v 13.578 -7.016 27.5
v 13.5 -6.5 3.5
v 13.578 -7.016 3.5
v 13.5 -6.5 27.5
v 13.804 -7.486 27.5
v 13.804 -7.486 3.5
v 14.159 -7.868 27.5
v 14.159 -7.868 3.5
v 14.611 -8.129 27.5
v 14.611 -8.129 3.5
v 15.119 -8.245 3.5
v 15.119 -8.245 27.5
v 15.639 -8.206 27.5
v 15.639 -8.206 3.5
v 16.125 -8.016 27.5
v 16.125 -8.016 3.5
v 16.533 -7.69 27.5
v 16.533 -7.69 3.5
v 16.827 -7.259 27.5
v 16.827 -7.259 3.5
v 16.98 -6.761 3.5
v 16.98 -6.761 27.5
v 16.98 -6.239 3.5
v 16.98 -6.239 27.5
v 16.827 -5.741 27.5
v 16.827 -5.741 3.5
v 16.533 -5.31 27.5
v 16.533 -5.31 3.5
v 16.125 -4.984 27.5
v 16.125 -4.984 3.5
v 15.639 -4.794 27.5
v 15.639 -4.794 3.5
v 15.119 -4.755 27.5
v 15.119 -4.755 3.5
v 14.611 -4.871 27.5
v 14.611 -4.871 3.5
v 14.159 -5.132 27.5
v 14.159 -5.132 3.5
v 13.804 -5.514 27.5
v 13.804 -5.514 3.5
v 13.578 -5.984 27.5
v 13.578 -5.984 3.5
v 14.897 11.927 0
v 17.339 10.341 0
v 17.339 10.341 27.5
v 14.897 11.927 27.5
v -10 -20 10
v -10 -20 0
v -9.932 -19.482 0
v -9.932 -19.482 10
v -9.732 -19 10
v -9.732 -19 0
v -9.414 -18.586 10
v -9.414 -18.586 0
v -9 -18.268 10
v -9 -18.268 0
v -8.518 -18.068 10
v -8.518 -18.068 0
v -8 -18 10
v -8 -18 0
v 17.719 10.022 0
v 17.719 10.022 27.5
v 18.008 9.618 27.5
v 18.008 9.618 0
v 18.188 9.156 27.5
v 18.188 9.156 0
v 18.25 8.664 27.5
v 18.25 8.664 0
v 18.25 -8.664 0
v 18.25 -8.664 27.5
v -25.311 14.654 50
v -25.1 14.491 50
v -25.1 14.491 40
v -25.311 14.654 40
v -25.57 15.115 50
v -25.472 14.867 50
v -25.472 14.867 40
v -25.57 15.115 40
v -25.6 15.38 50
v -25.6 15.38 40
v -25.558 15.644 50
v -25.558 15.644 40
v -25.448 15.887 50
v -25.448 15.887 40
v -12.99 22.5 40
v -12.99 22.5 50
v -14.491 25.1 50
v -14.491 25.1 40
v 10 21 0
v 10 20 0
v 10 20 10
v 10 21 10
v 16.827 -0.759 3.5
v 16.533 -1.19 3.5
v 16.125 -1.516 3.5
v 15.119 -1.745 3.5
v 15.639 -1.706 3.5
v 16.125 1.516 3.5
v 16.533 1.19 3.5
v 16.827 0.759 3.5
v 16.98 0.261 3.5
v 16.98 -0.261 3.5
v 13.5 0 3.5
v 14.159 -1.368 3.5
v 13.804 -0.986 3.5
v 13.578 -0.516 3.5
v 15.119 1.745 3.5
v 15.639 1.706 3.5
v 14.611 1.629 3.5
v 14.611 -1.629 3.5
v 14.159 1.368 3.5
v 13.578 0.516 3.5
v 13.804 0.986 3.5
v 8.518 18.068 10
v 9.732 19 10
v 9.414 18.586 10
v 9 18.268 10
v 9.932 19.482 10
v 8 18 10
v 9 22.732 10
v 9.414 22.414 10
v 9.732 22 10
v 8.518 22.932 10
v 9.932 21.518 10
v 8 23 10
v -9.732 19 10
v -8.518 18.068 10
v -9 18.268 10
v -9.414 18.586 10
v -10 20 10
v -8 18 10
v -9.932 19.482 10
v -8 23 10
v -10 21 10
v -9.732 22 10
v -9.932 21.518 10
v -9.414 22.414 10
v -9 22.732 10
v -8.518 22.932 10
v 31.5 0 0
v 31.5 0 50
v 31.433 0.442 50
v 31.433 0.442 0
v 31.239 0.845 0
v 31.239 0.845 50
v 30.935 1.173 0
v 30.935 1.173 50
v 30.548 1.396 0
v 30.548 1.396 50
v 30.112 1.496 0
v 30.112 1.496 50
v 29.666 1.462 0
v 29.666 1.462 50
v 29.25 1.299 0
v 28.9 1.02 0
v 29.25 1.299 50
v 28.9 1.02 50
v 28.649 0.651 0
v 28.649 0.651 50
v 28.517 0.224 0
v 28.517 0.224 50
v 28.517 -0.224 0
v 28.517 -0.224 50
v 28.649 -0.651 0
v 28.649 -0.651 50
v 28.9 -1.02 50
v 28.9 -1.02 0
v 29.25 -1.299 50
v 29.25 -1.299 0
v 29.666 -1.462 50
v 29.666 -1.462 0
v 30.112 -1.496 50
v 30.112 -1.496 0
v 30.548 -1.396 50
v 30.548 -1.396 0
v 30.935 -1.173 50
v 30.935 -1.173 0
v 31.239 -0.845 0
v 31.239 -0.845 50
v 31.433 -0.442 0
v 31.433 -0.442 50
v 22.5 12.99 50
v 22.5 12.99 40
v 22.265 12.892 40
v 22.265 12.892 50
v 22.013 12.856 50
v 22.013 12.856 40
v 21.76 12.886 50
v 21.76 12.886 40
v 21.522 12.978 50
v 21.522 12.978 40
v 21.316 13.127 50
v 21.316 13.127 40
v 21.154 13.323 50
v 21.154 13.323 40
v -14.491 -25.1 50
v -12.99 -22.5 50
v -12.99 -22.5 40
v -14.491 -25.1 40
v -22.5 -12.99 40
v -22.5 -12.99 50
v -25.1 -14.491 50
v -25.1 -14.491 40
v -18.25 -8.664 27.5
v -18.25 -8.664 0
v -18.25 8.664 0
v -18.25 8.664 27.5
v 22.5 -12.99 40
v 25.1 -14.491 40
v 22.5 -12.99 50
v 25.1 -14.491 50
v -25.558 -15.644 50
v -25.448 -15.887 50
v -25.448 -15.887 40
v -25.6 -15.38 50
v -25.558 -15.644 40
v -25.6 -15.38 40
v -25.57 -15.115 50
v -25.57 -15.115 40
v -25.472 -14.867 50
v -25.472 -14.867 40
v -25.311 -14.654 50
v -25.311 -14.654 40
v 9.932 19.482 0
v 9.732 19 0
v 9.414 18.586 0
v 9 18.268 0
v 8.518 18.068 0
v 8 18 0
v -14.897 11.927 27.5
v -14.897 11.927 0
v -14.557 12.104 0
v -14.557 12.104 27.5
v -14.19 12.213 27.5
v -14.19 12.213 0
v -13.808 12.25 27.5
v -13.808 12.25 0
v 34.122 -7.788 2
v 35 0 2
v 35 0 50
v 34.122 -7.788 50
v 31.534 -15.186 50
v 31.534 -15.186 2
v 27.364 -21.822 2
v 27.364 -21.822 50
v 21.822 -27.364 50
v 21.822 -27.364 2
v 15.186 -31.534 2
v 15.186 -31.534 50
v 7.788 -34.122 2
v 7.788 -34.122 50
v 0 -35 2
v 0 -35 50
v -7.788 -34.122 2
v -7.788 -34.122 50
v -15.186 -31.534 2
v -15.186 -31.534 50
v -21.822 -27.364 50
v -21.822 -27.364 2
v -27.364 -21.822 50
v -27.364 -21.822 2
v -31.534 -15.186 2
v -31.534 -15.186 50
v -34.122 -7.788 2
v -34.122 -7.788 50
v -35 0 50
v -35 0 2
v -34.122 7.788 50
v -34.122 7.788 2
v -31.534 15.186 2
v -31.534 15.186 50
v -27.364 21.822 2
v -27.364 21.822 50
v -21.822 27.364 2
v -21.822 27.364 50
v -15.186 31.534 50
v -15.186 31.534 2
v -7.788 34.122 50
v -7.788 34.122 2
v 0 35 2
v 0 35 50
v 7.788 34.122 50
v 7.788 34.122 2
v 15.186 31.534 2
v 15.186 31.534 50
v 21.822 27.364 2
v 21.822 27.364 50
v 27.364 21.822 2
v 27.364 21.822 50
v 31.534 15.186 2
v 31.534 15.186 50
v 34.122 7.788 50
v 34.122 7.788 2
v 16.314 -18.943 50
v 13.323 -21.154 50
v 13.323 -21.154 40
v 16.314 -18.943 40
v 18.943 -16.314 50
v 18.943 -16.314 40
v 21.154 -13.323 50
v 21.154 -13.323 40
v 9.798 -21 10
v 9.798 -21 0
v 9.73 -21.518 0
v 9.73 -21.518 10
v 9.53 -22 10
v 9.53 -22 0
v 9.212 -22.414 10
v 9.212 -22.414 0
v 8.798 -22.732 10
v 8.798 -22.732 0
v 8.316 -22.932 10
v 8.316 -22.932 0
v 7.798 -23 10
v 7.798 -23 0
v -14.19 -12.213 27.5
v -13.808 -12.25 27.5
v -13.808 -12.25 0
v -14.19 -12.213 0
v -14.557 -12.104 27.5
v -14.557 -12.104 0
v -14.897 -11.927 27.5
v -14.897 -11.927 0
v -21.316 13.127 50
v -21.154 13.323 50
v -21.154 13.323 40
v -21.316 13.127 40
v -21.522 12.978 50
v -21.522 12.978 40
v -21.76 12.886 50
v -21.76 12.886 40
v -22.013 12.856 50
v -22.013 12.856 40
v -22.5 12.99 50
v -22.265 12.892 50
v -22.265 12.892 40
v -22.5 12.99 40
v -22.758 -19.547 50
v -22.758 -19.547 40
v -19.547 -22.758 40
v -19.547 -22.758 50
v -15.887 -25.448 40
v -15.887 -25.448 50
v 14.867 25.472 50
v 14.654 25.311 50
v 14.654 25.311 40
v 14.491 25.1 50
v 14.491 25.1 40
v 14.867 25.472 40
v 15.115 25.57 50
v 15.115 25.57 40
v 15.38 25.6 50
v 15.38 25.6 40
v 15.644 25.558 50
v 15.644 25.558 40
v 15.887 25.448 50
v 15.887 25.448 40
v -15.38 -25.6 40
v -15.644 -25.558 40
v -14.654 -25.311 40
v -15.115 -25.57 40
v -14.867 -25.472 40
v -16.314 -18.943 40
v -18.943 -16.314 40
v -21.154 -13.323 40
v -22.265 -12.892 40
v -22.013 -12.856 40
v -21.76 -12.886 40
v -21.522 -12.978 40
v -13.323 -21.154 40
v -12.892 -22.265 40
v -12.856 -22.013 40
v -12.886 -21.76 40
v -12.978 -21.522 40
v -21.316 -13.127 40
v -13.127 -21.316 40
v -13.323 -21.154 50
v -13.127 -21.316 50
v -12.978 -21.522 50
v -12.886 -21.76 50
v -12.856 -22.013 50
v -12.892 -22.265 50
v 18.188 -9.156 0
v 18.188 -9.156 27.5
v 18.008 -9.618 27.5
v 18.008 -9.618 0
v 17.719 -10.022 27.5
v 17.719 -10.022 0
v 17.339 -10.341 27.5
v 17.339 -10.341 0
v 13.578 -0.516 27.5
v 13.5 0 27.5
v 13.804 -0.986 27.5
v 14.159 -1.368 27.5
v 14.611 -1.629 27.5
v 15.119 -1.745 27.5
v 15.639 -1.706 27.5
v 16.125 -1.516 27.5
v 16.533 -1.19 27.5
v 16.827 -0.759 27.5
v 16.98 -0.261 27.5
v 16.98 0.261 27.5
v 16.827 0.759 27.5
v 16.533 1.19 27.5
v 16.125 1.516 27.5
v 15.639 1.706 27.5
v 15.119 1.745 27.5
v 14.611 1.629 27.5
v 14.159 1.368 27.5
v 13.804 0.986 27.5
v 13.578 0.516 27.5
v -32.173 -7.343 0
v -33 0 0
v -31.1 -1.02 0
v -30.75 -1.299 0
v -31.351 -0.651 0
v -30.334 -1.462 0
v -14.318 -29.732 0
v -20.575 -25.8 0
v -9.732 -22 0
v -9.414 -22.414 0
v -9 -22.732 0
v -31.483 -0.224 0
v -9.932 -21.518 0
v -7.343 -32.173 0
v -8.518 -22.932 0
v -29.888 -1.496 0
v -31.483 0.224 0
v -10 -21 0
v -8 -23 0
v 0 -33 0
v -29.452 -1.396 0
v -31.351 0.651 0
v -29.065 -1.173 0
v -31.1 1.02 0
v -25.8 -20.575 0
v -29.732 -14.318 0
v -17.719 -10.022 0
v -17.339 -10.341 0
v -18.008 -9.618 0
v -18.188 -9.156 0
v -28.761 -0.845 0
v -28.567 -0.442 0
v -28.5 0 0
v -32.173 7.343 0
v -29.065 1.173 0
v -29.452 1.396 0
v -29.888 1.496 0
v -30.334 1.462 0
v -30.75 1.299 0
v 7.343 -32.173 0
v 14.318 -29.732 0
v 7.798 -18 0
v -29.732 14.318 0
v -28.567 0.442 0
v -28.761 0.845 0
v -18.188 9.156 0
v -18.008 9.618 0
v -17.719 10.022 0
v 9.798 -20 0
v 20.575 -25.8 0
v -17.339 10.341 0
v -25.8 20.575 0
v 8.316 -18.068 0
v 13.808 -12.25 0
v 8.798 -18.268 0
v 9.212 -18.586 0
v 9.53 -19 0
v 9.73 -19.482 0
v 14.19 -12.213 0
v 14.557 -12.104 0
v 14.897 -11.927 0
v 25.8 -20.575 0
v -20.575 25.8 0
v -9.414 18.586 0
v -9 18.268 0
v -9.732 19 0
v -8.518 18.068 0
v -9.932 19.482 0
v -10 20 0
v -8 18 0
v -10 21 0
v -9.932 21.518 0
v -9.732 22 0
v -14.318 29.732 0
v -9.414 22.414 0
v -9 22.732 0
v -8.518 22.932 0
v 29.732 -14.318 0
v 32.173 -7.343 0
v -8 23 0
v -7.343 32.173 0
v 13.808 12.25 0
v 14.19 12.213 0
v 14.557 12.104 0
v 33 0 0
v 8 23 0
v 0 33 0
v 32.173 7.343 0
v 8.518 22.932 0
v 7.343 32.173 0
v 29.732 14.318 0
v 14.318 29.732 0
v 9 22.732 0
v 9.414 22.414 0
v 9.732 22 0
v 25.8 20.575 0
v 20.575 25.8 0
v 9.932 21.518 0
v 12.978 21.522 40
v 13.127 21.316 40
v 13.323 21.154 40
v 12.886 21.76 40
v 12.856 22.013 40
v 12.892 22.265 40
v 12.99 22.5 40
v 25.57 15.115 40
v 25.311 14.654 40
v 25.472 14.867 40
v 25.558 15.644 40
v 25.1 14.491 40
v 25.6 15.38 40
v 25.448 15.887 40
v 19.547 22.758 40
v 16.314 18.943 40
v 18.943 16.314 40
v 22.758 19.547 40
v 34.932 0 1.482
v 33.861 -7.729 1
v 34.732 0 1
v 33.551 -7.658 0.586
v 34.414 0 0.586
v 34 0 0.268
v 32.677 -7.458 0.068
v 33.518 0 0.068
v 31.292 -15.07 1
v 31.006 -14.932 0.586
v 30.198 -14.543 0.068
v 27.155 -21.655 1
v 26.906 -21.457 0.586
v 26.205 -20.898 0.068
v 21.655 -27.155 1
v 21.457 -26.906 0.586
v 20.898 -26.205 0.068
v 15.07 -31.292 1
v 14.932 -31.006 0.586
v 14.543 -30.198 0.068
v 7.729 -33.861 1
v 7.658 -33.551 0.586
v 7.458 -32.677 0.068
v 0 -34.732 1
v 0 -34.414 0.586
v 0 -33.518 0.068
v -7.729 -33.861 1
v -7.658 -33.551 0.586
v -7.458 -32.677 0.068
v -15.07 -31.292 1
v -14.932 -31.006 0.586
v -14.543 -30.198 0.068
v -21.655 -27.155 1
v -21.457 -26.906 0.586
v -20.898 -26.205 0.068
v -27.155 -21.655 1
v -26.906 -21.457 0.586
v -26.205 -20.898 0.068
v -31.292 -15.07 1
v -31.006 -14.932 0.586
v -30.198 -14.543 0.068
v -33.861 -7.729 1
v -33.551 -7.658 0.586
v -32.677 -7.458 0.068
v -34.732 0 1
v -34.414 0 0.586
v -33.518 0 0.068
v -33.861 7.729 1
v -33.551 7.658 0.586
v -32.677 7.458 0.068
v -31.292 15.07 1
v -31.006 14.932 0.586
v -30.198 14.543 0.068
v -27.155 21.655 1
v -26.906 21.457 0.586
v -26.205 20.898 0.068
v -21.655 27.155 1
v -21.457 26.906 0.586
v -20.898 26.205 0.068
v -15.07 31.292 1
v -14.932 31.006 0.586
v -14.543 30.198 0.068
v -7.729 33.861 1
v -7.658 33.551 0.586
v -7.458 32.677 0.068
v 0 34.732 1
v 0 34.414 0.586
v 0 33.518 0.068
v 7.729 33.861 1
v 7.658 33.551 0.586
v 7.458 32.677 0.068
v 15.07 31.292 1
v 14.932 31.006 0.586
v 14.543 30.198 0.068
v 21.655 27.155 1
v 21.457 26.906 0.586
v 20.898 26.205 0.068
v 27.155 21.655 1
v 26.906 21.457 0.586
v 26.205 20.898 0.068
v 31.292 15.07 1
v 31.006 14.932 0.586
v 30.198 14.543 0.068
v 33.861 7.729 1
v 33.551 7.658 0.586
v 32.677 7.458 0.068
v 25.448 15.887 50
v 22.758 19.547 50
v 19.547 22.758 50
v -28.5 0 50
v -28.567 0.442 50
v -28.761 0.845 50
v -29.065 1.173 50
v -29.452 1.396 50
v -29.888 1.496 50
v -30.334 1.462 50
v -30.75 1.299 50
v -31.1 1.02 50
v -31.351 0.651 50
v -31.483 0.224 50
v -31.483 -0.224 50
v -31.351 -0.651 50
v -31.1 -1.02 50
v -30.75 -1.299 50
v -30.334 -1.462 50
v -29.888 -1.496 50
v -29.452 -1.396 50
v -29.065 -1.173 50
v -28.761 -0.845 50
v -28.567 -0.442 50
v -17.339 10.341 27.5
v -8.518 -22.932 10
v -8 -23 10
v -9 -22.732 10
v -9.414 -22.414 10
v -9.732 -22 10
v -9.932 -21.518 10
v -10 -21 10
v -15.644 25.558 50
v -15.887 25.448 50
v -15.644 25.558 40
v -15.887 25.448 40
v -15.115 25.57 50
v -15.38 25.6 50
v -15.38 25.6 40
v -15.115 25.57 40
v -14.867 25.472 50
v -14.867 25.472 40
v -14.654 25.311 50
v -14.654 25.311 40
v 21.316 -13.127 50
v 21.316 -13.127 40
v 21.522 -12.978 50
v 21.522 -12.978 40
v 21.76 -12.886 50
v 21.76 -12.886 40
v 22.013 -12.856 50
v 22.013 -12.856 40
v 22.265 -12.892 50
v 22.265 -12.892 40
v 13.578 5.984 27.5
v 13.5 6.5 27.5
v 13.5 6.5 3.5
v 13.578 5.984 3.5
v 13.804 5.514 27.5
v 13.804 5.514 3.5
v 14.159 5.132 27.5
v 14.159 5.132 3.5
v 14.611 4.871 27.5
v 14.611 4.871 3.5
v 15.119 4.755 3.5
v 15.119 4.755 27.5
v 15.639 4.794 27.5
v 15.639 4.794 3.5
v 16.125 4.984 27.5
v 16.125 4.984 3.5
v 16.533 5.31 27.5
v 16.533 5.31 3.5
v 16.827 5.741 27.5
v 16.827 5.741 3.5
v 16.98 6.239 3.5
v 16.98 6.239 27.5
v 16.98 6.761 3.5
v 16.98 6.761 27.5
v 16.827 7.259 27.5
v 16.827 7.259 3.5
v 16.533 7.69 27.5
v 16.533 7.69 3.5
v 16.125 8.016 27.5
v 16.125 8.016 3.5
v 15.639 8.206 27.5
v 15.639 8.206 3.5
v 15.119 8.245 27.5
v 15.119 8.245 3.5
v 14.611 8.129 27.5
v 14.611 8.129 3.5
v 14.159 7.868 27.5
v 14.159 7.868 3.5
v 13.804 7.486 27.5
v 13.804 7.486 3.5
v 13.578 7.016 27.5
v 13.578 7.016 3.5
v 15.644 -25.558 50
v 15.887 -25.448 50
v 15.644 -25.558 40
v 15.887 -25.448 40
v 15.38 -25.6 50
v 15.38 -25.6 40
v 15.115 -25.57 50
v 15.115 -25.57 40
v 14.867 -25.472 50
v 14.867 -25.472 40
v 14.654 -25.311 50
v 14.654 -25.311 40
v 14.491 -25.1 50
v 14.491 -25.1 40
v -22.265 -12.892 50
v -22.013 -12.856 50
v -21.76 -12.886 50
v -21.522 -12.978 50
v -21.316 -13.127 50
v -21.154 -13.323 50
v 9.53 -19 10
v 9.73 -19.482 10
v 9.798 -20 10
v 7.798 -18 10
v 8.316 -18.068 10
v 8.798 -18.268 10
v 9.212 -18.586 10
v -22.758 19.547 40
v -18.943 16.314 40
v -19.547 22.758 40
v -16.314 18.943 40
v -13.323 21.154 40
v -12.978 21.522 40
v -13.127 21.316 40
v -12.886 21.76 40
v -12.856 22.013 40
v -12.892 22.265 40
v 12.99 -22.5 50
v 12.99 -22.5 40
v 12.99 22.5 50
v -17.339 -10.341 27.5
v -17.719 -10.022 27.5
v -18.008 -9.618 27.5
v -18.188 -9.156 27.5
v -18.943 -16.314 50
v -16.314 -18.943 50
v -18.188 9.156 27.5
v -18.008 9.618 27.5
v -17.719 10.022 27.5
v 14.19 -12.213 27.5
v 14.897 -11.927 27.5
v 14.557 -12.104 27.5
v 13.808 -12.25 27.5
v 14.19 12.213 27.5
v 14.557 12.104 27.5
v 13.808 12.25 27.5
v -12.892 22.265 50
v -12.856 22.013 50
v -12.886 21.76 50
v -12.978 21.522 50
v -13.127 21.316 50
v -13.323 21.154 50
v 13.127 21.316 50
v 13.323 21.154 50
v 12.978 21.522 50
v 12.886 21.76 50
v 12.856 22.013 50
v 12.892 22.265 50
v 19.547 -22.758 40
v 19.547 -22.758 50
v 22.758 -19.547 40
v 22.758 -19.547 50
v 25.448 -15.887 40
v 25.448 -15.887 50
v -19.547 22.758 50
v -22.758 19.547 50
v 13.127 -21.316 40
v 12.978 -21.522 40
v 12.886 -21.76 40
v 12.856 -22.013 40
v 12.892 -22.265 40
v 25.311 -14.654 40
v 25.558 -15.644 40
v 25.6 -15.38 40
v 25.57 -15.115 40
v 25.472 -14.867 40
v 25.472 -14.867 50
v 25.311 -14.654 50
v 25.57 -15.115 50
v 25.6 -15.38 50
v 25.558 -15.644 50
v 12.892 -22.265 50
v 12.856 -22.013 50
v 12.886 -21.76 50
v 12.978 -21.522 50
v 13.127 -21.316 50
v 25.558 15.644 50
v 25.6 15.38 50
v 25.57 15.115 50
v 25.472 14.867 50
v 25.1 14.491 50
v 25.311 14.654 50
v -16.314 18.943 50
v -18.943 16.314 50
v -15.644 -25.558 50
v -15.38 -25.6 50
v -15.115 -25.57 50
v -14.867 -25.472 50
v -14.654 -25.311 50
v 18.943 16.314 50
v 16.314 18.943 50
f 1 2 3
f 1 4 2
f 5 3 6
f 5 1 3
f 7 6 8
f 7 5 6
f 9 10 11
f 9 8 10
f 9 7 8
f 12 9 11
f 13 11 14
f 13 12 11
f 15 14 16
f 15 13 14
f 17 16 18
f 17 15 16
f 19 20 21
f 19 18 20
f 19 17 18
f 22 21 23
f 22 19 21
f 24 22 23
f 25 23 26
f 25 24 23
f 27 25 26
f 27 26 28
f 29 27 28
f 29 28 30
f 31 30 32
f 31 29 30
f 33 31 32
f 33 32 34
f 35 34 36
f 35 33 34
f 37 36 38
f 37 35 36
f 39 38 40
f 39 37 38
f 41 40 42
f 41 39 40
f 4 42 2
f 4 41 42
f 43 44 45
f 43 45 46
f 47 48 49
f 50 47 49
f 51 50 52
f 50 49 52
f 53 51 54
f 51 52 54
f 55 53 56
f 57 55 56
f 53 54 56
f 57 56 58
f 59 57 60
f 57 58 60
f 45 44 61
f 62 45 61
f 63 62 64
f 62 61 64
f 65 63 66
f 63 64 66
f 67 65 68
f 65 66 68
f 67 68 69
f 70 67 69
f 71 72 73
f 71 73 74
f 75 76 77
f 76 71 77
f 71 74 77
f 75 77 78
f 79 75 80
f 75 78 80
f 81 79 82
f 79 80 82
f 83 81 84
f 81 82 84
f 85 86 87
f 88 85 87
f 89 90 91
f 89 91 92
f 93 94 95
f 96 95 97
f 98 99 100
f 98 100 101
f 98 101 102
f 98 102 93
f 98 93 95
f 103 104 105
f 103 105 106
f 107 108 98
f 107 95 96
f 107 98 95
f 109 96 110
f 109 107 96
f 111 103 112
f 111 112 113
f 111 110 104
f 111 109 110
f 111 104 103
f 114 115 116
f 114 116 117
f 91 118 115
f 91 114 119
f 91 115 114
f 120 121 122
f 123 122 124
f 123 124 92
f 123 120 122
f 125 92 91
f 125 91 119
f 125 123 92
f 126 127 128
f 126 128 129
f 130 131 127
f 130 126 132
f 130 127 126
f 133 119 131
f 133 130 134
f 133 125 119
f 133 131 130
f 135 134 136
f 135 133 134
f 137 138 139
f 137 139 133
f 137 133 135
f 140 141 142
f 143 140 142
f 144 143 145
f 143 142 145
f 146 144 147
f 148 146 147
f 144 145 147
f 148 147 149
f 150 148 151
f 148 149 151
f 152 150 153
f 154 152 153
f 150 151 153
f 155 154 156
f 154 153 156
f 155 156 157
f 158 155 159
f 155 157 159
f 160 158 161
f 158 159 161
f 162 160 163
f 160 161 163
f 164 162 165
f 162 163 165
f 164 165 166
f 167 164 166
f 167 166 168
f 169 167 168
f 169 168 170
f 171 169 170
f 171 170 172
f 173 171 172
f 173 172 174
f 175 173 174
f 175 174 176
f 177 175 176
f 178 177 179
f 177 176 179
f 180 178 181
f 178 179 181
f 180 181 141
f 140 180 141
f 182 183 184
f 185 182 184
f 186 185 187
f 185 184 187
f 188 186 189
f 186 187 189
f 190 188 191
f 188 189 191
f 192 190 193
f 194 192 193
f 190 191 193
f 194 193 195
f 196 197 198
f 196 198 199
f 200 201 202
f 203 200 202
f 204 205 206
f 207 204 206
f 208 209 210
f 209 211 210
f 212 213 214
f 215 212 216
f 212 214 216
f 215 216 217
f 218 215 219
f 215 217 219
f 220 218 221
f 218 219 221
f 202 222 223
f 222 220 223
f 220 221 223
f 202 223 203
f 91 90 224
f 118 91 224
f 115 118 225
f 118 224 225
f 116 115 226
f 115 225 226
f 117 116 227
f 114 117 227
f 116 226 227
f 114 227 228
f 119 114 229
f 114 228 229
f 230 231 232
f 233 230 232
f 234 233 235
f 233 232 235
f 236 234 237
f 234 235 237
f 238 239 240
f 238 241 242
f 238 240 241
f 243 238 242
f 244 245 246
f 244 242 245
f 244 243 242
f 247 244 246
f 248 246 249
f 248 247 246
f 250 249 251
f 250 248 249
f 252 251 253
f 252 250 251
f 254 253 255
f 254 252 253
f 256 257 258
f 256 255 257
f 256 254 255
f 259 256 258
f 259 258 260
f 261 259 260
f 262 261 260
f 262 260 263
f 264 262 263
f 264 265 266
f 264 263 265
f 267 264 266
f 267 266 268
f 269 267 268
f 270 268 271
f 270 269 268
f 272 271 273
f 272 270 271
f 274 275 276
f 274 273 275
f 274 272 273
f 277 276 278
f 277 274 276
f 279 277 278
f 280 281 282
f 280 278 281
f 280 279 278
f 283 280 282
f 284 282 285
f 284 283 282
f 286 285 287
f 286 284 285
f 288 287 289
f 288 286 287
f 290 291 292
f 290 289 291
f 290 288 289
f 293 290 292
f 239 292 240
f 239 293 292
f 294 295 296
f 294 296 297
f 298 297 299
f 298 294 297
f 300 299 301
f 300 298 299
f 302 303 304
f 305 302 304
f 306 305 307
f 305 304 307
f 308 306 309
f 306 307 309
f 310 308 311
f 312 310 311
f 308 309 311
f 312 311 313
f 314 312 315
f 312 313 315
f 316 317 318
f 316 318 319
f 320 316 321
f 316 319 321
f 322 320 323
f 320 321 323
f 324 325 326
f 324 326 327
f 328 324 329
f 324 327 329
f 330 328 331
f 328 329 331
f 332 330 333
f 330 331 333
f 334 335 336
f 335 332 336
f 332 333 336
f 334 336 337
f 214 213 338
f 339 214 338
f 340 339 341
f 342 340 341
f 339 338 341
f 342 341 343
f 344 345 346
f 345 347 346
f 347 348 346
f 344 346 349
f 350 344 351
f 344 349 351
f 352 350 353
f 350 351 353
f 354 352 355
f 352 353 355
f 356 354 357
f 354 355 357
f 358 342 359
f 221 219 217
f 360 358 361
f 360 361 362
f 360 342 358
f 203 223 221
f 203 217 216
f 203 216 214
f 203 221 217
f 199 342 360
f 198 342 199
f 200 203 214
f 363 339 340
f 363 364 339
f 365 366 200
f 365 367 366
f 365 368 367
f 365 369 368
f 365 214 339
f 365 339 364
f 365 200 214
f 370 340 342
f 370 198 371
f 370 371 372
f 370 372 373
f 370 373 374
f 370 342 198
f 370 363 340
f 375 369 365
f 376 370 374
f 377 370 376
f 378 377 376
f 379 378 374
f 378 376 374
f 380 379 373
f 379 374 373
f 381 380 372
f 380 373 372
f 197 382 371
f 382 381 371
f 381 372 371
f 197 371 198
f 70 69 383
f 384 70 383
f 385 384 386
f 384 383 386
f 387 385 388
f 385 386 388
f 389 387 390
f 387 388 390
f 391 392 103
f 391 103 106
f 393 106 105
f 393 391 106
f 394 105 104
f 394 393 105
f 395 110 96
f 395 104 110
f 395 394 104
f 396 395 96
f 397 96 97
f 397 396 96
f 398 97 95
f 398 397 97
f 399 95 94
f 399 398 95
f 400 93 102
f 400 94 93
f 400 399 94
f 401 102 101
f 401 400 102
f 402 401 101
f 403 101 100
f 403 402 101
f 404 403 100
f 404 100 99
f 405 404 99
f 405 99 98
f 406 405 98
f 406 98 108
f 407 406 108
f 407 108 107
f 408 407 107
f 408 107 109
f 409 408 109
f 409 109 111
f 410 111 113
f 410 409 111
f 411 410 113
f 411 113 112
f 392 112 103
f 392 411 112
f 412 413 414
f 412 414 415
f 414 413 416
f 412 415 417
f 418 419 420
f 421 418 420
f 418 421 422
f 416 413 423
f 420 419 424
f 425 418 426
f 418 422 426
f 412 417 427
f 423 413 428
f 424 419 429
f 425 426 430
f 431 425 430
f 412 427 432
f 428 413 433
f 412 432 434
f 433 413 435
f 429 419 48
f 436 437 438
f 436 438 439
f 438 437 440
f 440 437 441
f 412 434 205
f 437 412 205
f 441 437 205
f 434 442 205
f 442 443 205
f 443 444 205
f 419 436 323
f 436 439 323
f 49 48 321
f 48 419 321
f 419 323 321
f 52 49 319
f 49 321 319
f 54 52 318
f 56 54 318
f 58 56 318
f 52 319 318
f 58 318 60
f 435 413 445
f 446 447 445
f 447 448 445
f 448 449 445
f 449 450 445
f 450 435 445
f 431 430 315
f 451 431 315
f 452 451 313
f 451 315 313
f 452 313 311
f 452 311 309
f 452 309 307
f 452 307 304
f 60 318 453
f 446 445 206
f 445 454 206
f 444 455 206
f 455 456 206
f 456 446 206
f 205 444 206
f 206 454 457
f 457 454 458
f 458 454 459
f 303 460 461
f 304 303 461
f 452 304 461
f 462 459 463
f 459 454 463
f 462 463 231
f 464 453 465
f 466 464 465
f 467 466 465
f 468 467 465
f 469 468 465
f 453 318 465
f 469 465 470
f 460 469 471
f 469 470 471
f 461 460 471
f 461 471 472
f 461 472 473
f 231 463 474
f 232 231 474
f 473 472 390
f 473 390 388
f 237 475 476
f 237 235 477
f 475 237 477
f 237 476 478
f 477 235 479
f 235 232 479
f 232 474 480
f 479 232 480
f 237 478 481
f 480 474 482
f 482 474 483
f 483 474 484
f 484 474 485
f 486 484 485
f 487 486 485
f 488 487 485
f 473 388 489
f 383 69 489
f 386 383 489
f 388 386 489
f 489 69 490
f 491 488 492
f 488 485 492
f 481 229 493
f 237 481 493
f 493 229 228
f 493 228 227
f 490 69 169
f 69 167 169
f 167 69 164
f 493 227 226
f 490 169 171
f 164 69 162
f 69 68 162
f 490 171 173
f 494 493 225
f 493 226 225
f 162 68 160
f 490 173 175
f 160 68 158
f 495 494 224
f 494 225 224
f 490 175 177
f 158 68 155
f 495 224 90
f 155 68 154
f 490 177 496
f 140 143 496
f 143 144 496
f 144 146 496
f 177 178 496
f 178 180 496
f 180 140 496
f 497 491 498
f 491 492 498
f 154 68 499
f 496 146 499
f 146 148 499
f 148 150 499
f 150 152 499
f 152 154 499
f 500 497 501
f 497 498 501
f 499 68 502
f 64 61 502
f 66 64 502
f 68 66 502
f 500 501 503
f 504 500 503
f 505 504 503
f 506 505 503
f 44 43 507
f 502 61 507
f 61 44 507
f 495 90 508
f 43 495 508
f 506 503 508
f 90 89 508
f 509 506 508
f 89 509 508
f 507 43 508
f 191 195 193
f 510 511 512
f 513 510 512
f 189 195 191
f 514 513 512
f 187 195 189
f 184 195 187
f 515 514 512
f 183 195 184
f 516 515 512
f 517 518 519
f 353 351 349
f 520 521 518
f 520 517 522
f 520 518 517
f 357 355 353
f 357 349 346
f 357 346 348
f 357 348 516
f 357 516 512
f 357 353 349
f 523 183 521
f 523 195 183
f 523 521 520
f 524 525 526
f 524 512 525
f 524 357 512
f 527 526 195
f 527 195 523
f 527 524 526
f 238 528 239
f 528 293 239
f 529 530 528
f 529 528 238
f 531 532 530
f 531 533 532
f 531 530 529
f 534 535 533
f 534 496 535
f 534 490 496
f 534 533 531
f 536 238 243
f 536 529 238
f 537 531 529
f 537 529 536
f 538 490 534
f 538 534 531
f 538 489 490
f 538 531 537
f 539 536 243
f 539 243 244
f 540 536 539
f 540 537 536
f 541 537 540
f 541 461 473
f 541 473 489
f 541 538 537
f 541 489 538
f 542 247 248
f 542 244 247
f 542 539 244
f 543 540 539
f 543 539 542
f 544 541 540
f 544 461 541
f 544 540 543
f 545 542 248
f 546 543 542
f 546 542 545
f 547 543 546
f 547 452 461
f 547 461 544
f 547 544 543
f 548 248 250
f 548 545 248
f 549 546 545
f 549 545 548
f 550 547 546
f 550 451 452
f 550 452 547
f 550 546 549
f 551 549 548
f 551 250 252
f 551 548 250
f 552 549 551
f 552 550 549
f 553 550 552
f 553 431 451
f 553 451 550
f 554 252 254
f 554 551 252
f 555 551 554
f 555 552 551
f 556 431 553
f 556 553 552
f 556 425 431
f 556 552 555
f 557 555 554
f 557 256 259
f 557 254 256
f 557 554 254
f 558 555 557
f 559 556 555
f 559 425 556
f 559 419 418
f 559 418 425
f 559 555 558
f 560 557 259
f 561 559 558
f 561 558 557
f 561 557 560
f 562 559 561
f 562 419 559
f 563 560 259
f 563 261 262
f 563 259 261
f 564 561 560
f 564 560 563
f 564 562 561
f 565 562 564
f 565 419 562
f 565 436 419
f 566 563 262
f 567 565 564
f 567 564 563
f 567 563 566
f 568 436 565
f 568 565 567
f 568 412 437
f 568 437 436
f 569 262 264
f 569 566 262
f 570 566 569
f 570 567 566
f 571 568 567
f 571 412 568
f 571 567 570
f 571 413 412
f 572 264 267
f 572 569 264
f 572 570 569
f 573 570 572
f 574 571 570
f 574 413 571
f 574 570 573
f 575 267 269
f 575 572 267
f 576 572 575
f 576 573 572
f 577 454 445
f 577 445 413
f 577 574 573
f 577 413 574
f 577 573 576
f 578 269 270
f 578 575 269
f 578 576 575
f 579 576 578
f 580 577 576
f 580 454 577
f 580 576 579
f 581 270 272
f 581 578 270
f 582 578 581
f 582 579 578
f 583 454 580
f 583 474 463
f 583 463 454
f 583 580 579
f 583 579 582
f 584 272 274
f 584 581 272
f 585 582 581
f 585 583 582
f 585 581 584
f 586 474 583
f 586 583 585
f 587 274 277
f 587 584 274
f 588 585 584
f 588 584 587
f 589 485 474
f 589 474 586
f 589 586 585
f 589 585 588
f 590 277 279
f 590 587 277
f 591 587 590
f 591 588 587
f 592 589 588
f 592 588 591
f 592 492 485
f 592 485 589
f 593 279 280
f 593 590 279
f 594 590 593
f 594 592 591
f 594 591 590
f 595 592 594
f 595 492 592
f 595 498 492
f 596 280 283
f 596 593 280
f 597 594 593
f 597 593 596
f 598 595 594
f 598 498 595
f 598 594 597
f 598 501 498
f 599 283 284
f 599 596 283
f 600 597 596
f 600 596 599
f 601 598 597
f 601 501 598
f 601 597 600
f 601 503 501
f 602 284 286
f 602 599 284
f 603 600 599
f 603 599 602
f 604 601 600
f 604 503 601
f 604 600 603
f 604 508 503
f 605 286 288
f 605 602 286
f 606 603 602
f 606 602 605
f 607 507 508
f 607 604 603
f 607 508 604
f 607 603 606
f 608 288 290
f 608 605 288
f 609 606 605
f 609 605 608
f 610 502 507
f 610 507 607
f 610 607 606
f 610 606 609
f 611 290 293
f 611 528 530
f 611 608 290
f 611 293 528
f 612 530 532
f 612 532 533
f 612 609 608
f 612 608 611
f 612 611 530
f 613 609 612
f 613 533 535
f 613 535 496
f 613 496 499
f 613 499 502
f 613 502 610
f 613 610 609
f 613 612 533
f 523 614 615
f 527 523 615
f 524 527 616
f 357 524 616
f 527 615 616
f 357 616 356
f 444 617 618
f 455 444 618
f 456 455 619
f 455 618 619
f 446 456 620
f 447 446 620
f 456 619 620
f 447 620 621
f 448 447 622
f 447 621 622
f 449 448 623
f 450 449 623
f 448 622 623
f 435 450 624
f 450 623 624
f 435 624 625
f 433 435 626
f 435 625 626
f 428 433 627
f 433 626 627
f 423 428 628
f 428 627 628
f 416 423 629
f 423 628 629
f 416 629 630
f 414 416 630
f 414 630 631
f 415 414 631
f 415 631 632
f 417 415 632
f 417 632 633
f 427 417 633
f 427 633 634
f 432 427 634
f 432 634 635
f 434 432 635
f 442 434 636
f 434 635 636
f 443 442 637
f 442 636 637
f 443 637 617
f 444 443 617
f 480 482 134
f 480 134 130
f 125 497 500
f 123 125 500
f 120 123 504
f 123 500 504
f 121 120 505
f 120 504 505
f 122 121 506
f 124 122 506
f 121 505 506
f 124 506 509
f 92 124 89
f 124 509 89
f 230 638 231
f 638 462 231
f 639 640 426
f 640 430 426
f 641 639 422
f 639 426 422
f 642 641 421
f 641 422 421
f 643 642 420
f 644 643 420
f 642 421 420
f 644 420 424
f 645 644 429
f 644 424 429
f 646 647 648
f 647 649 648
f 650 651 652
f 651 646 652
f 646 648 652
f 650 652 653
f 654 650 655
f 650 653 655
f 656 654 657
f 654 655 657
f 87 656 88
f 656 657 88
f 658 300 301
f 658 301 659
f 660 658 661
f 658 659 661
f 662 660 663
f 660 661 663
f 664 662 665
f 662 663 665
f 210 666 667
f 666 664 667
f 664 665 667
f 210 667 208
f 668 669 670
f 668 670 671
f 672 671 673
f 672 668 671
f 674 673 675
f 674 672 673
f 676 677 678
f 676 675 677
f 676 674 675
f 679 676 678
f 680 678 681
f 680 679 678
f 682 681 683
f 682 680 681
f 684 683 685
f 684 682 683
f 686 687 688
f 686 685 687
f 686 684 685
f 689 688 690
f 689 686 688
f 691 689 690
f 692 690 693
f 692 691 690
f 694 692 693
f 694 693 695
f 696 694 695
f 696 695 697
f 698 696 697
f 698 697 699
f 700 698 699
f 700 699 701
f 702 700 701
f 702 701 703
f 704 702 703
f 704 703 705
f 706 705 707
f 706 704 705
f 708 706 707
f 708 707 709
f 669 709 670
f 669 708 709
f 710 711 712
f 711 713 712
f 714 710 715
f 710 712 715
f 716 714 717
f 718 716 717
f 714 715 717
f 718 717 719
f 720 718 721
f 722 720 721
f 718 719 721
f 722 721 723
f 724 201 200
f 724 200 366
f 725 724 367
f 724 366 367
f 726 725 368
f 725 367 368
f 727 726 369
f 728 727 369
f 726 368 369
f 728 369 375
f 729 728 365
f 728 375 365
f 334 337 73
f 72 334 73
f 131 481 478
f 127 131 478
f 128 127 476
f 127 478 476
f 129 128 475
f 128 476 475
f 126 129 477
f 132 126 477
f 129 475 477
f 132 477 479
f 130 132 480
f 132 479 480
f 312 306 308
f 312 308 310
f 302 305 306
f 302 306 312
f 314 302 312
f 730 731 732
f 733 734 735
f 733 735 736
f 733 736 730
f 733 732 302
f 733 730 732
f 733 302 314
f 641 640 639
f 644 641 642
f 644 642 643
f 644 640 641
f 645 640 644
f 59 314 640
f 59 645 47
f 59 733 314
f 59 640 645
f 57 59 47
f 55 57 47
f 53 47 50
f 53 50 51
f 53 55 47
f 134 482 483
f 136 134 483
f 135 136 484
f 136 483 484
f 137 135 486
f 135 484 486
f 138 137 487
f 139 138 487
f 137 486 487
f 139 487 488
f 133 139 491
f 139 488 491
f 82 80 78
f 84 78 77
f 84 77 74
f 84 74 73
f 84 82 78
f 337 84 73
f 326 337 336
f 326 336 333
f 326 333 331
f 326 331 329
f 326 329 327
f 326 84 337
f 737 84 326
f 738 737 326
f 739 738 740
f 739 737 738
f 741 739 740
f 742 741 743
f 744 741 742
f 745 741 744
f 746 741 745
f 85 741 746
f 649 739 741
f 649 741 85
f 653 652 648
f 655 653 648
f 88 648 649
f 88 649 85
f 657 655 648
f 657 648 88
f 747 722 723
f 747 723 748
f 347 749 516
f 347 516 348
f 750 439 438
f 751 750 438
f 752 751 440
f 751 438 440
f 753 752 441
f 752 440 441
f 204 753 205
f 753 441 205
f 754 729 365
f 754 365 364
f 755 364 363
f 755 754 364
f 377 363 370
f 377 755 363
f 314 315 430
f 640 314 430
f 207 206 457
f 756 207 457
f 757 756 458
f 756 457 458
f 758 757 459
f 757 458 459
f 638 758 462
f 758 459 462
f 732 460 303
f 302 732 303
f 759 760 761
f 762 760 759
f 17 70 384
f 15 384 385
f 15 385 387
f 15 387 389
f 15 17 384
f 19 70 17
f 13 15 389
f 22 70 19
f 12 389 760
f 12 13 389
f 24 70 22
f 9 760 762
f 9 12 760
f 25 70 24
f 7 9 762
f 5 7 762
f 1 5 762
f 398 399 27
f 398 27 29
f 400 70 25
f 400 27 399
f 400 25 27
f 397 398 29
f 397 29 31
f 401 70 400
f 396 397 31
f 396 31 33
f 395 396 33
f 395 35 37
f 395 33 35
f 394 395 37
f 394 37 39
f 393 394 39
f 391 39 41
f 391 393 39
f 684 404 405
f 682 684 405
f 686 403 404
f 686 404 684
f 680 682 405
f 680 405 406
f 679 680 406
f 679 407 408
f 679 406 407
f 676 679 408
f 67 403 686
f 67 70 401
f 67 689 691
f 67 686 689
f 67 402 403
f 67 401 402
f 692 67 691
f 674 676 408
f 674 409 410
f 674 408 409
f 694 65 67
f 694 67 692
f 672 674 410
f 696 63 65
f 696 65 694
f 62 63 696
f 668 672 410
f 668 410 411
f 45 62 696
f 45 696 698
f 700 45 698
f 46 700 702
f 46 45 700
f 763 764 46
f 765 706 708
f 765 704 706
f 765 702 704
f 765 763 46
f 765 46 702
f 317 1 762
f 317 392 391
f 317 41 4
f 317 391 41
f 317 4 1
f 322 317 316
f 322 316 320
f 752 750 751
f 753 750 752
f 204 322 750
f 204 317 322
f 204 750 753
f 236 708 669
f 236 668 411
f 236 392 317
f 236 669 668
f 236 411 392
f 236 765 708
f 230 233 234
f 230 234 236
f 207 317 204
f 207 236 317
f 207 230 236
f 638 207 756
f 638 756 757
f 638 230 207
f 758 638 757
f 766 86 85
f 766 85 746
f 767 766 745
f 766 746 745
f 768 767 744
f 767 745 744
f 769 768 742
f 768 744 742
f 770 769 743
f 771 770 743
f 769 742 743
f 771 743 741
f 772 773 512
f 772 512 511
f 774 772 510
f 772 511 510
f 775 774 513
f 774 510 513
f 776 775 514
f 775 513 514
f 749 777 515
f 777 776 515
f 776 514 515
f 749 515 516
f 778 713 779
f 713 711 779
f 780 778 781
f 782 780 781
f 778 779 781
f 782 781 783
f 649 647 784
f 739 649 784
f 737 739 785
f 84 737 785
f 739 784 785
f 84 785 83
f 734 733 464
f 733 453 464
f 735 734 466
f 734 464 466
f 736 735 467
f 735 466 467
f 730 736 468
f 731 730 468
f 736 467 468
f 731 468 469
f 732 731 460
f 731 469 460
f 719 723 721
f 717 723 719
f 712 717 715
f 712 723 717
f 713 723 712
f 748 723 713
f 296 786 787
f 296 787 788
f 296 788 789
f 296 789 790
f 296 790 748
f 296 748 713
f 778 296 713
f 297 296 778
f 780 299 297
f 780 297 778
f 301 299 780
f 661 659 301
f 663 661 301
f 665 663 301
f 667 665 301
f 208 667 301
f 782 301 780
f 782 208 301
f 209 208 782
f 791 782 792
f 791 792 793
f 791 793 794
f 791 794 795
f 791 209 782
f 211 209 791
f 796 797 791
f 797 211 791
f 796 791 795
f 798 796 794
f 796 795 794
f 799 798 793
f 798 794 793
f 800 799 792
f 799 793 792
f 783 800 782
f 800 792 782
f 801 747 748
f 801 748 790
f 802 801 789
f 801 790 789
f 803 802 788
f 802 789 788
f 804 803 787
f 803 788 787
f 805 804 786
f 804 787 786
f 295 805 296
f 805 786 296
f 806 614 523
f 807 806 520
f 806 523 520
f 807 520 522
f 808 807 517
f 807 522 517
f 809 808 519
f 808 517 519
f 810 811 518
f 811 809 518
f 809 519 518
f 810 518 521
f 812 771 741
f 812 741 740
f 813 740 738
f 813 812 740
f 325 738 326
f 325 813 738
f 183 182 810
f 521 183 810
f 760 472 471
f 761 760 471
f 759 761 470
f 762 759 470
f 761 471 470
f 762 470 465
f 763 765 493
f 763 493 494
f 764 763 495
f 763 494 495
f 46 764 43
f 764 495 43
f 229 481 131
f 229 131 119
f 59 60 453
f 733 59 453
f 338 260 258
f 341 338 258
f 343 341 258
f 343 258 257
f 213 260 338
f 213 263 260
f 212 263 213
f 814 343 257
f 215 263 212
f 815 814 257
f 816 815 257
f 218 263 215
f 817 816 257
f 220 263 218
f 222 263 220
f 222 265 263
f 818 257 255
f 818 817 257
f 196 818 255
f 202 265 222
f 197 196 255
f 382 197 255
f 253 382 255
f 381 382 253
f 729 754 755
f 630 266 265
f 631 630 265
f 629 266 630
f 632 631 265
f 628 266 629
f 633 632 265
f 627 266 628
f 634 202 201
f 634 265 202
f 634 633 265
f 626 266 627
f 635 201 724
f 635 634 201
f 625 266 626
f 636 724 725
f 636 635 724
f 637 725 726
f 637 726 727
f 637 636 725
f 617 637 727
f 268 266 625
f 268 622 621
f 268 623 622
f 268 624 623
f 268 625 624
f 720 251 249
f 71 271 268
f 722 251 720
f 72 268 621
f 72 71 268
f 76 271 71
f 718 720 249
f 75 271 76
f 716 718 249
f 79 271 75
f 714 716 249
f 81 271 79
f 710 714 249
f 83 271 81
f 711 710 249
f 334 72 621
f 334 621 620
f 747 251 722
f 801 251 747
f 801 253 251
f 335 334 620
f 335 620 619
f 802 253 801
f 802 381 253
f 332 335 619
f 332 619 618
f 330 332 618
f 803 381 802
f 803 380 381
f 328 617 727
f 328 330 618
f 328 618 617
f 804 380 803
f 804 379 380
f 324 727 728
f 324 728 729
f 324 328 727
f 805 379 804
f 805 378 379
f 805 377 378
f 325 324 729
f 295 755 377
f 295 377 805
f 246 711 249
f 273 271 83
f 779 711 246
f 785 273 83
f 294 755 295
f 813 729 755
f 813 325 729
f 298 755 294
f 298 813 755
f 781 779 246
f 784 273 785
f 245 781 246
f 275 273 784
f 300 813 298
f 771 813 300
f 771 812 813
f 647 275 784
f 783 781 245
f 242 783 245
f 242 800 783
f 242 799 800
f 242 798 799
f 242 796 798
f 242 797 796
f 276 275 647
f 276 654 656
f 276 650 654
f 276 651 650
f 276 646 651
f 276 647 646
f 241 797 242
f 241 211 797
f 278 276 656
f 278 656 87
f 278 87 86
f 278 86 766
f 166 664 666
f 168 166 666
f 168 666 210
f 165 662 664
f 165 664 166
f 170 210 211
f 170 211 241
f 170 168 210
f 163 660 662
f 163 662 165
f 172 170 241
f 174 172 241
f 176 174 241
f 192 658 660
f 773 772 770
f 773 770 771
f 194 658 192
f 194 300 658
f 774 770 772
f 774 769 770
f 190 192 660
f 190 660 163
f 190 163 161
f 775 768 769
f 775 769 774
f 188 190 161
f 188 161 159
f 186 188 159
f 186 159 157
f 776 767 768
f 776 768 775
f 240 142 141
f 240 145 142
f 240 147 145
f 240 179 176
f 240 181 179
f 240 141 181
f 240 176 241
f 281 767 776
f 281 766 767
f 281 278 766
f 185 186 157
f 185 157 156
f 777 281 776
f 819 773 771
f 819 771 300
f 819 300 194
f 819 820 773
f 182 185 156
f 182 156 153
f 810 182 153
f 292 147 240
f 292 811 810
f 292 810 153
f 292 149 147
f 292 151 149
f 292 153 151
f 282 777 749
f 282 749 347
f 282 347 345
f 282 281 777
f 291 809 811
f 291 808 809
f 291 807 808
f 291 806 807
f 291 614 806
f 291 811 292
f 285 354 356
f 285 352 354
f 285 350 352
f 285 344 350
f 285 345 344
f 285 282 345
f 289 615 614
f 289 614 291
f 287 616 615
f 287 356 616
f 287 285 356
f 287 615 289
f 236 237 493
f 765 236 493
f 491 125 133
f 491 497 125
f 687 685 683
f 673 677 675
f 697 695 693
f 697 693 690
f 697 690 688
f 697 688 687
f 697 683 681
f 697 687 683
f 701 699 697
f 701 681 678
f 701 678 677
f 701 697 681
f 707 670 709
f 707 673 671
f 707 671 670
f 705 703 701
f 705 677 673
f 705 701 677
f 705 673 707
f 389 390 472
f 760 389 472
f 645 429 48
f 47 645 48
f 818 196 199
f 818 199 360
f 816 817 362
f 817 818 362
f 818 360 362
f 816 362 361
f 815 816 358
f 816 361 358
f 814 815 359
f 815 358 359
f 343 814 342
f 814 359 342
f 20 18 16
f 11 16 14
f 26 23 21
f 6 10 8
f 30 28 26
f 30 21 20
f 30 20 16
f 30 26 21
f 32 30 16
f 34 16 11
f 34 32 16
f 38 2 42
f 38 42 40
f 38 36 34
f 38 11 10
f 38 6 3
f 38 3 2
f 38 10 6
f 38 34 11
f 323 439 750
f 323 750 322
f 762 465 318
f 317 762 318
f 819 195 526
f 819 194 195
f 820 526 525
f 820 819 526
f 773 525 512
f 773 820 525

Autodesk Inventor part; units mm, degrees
ref_plane "YZ Plane" through (0, 0, 0) normal (1, 0, 0) x (0, 1, 0)
ref_plane "XZ Plane" through (0, 0, 0) normal (0, 1, 0) x (-1, 0, 0)
ref_plane "XY Plane" through (0, 0, 0) normal (0, 0, 1) x (1, 0, 0)
sketch "Sketch1" plane through (0, 0, 0) normal (0, 0, 1) x (1, 0, 0)
  circle A0 centre (0, 0) radius 35
  dimension "d0" = 70
extrude "Extrusion1" add sketch "Sketch1" along normal blind 50
sketch "Sketch4" plane through (0, 0, 50) normal (0, 0, 1) x (1, 0, 0)
  circle A0 centre (30, 0) radius 1.5
  dimension "d104" = 3
sketch "Sketch6" plane through (0, 0, 50) normal (0, 0, 1) x (1, 0, 0)
  circle A0 centre (-30, 0) radius 1.5
  point P0 (0, 0)
  dimension "d105" = 3
sketch "Sketch11" plane through (0, 0, 0) normal (0, 0, -1) x (-1, 0, 0)
  line L0 (13.8079, 12.25) -> (-13.8079, 12.25)
  line L1 (-18.25, 8.6641) -> (-18.25, -8.6641)
  line L2 (-13.8079, -12.25) -> (13.8079, -12.25)
  line L3 (18.25, -8.6641) -> (18.25, 8.6641)
  line L4 (17.3393, 10.3414) -> (14.8972, 11.9273)
  line L5 (17.3393, -10.3414) -> (14.8972, -11.9273)
  line L6 (-17.3393, 10.3414) -> (-14.8972, 11.9273)
  line L7 (-17.3393, -10.3414) -> (-14.8972, -11.9273)
  arc A0 (18.25, 8.6641) -> (17.3393, 10.3414) centre (16.25, 8.6641) ccw
  arc A1 (14.8972, 11.9273) -> (13.8079, 12.25) centre (13.8079, 10.25) ccw
  arc A2 (17.3393, -10.3414) -> (18.25, -8.6641) centre (16.25, -8.6641) ccw
  arc A3 (13.8079, -12.25) -> (14.8972, -11.9273) centre (13.8079, -10.25) ccw
  arc A4 (-14.8972, -11.9273) -> (-13.8079, -12.25) centre (-13.8079, -10.25) ccw
  arc A5 (-18.25, -8.6641) -> (-17.3393, -10.3414) centre (-16.25, -8.6641) ccw
  arc A6 (-17.3393, 10.3414) -> (-18.25, 8.6641) centre (-16.25, 8.6641) ccw
  arc A7 (-13.8079, 12.25) -> (-14.8972, 11.9273) centre (-13.8079, 10.25) ccw
  point P0 (18.25, 12.25)
  point P1 (-18.25, -12.25)
  point P2 (-18.25, 12.25)
  point P3 (18.25, -12.25)
  point P4 (18.25, 9.75)
  point P5 (18.25, -9.75)
  point P6 (-18.25, 9.75)
  point P7 (-18.25, -9.75)
  dimension "d73" = 36.5
  dimension "d74" = 24.5
  dimension "d75" = 2.5
  dimension "d76" = 57
  dimension "d77" = 2.5
  dimension "d78" = 57
  dimension "d79" = 2.5
  dimension "d80" = 57
  dimension "d81" = 2.5
  dimension "d82" = 57
  dimension "d83" = 2
extrude "Extrusion2" cut sketch "Sketch11" against normal blind 27.5
sketch "Sketch12" plane through (0, 0, 50) normal (0, 0, 1) x (1, 0, 0)
  line L0 (0, 0) -> (30, 0) construction
  line L1 (0, 0) -> (30, 0) construction
  arc A0 (-12.5, 21.6506) -> (-21.6506, 12.5) centre (0, 0) ccw
  arc A1 (-15, 25.9808) -> (-25.9808, 15) centre (0, 0) ccw
  arc A2 (25.9808, 15) -> (15, 25.9808) centre (0, 0) ccw
  arc A3 (21.6506, 12.5) -> (12.5, 21.6506) centre (0, 0) ccw
  arc A4 (15, -25.9808) -> (25.9808, -15) centre (0, 0) ccw
  arc A5 (12.5, -21.6506) -> (21.6506, -12.5) centre (0, 0) ccw
  arc A6 (-21.6506, -12.5) -> (-12.5, -21.6506) centre (0, 0) ccw
  arc A7 (-25.9808, -15) -> (-15, -25.9808) centre (0, 0) ccw
  line L2 (-21.6506, 12.5) -> (-25.9808, 15)
  line L3 (-12.5, 21.6506) -> (-15, 25.9808)
  line L4 (12.5, 21.6506) -> (15, 25.9808)
  line L5 (21.6506, 12.5) -> (25.9808, 15)
  line L6 (25.9808, -15) -> (21.6506, -12.5)
  line L7 (15, -25.9808) -> (12.5, -21.6506)
  line L8 (-12.5, -21.6506) -> (-15, -25.9808)
  line L9 (-21.6506, -12.5) -> (-25.9808, -15)
extrude "Extrusion3" cut sketch "Sketch12" against normal blind 10
fillet "Fillet3" radius 2 1 edges at (-35, 0, 0)
fillet "Fillet6" radius 1 16 edges at (12.5, 21.6506, 45) (21.6506, 12.5, 45) (25.9808, 15, 45) (15, 25.9808, 45) (-15, 25.9808, 45) (-12.5, 21.6506, 45) (-21.6506, 12.5, 45) (-25.9808, 15, 45) (-21.6506, -12.5, 45) (-25.9808, -15, 45) (-15, -25.9808, 45) (-12.5, -21.6506, 45) (12.5, -21.6506, 45) (15, -25.9808, 45) (25.9808, -15, 45) (21.6506, -12.5, 45)
sketch "Sketch15" plane through (0, 0, 27.5) normal (0, 0, -1) x (-1, 0, 0)
  circle A0 centre (-15.25, 0) radius 1.75
  circle A1 centre (-15.25, -6.5) radius 1.75
  circle A2 centre (-15.25, 6.5) radius 1.75
  point P0 (0, 0)
  dimension "d85" = 3.5
extrude "Extrusion6" add sketch "Sketch15" along normal blind 24
sketch "Sketch16" plane through (0, 0, 0) normal (0, 0, -1) x (-1, 0, 0)
  line L0 (-8, 23) -> (8, 23)
  line L1 (10, 21) -> (10, 20)
  line L2 (8, 18) -> (-8, 18)
  line L3 (-10, 20) -> (-10, 21)
  arc A0 (21.1538, 13.3235) -> (13.3235, 21.1538) centre (0, 0) ccw projected
  line L4 (8, -18) -> (-7.798, -18)
  line L5 (-9.798, -20) -> (-9.798, -21)
  line L6 (-7.798, -23) -> (8, -23)
  line L7 (10, -21) -> (10, -20)
  arc A1 (10, 21) -> (8, 23) centre (8, 21) ccw
  arc A2 (8, 18) -> (10, 20) centre (8, 20) ccw
  arc A3 (-10, 20) -> (-8, 18) centre (-8, 20) ccw
  arc A4 (-8, 23) -> (-10, 21) centre (-8, 21) ccw
  arc A5 (-7.798, -18) -> (-9.798, -20) centre (-7.798, -20) ccw
  arc A6 (10, -20) -> (8, -18) centre (8, -20) ccw
  arc A7 (8, -23) -> (10, -21) centre (8, -21) ccw
  arc A8 (-9.798, -21) -> (-7.798, -23) centre (-7.798, -21) ccw
  point P0 (0, 0)
  point P1 (10, 18)
  point P2 (10, 23)
  point P3 (-10, 18)
  point P4 (10, -18)
  point P5 (-9.798, -23)
  point P6 (-9.798, -18)
  dimension "d90" = 20
  dimension "d91" = 5
  dimension "d92" = 5
  dimension "d93" = 2
extrude "Extrusion7" cut sketch "Sketch16" against normal blind 10
extrude "Extrusion10" cut sketch "Sketch6" against normal through all
extrude "Extrusion11" cut sketch "Sketch4" against normal through all
equation "\"d77\" = d75"
equation "\"d78\" = d76"
properties part number "middle orbit" material "ABS Plastic"
